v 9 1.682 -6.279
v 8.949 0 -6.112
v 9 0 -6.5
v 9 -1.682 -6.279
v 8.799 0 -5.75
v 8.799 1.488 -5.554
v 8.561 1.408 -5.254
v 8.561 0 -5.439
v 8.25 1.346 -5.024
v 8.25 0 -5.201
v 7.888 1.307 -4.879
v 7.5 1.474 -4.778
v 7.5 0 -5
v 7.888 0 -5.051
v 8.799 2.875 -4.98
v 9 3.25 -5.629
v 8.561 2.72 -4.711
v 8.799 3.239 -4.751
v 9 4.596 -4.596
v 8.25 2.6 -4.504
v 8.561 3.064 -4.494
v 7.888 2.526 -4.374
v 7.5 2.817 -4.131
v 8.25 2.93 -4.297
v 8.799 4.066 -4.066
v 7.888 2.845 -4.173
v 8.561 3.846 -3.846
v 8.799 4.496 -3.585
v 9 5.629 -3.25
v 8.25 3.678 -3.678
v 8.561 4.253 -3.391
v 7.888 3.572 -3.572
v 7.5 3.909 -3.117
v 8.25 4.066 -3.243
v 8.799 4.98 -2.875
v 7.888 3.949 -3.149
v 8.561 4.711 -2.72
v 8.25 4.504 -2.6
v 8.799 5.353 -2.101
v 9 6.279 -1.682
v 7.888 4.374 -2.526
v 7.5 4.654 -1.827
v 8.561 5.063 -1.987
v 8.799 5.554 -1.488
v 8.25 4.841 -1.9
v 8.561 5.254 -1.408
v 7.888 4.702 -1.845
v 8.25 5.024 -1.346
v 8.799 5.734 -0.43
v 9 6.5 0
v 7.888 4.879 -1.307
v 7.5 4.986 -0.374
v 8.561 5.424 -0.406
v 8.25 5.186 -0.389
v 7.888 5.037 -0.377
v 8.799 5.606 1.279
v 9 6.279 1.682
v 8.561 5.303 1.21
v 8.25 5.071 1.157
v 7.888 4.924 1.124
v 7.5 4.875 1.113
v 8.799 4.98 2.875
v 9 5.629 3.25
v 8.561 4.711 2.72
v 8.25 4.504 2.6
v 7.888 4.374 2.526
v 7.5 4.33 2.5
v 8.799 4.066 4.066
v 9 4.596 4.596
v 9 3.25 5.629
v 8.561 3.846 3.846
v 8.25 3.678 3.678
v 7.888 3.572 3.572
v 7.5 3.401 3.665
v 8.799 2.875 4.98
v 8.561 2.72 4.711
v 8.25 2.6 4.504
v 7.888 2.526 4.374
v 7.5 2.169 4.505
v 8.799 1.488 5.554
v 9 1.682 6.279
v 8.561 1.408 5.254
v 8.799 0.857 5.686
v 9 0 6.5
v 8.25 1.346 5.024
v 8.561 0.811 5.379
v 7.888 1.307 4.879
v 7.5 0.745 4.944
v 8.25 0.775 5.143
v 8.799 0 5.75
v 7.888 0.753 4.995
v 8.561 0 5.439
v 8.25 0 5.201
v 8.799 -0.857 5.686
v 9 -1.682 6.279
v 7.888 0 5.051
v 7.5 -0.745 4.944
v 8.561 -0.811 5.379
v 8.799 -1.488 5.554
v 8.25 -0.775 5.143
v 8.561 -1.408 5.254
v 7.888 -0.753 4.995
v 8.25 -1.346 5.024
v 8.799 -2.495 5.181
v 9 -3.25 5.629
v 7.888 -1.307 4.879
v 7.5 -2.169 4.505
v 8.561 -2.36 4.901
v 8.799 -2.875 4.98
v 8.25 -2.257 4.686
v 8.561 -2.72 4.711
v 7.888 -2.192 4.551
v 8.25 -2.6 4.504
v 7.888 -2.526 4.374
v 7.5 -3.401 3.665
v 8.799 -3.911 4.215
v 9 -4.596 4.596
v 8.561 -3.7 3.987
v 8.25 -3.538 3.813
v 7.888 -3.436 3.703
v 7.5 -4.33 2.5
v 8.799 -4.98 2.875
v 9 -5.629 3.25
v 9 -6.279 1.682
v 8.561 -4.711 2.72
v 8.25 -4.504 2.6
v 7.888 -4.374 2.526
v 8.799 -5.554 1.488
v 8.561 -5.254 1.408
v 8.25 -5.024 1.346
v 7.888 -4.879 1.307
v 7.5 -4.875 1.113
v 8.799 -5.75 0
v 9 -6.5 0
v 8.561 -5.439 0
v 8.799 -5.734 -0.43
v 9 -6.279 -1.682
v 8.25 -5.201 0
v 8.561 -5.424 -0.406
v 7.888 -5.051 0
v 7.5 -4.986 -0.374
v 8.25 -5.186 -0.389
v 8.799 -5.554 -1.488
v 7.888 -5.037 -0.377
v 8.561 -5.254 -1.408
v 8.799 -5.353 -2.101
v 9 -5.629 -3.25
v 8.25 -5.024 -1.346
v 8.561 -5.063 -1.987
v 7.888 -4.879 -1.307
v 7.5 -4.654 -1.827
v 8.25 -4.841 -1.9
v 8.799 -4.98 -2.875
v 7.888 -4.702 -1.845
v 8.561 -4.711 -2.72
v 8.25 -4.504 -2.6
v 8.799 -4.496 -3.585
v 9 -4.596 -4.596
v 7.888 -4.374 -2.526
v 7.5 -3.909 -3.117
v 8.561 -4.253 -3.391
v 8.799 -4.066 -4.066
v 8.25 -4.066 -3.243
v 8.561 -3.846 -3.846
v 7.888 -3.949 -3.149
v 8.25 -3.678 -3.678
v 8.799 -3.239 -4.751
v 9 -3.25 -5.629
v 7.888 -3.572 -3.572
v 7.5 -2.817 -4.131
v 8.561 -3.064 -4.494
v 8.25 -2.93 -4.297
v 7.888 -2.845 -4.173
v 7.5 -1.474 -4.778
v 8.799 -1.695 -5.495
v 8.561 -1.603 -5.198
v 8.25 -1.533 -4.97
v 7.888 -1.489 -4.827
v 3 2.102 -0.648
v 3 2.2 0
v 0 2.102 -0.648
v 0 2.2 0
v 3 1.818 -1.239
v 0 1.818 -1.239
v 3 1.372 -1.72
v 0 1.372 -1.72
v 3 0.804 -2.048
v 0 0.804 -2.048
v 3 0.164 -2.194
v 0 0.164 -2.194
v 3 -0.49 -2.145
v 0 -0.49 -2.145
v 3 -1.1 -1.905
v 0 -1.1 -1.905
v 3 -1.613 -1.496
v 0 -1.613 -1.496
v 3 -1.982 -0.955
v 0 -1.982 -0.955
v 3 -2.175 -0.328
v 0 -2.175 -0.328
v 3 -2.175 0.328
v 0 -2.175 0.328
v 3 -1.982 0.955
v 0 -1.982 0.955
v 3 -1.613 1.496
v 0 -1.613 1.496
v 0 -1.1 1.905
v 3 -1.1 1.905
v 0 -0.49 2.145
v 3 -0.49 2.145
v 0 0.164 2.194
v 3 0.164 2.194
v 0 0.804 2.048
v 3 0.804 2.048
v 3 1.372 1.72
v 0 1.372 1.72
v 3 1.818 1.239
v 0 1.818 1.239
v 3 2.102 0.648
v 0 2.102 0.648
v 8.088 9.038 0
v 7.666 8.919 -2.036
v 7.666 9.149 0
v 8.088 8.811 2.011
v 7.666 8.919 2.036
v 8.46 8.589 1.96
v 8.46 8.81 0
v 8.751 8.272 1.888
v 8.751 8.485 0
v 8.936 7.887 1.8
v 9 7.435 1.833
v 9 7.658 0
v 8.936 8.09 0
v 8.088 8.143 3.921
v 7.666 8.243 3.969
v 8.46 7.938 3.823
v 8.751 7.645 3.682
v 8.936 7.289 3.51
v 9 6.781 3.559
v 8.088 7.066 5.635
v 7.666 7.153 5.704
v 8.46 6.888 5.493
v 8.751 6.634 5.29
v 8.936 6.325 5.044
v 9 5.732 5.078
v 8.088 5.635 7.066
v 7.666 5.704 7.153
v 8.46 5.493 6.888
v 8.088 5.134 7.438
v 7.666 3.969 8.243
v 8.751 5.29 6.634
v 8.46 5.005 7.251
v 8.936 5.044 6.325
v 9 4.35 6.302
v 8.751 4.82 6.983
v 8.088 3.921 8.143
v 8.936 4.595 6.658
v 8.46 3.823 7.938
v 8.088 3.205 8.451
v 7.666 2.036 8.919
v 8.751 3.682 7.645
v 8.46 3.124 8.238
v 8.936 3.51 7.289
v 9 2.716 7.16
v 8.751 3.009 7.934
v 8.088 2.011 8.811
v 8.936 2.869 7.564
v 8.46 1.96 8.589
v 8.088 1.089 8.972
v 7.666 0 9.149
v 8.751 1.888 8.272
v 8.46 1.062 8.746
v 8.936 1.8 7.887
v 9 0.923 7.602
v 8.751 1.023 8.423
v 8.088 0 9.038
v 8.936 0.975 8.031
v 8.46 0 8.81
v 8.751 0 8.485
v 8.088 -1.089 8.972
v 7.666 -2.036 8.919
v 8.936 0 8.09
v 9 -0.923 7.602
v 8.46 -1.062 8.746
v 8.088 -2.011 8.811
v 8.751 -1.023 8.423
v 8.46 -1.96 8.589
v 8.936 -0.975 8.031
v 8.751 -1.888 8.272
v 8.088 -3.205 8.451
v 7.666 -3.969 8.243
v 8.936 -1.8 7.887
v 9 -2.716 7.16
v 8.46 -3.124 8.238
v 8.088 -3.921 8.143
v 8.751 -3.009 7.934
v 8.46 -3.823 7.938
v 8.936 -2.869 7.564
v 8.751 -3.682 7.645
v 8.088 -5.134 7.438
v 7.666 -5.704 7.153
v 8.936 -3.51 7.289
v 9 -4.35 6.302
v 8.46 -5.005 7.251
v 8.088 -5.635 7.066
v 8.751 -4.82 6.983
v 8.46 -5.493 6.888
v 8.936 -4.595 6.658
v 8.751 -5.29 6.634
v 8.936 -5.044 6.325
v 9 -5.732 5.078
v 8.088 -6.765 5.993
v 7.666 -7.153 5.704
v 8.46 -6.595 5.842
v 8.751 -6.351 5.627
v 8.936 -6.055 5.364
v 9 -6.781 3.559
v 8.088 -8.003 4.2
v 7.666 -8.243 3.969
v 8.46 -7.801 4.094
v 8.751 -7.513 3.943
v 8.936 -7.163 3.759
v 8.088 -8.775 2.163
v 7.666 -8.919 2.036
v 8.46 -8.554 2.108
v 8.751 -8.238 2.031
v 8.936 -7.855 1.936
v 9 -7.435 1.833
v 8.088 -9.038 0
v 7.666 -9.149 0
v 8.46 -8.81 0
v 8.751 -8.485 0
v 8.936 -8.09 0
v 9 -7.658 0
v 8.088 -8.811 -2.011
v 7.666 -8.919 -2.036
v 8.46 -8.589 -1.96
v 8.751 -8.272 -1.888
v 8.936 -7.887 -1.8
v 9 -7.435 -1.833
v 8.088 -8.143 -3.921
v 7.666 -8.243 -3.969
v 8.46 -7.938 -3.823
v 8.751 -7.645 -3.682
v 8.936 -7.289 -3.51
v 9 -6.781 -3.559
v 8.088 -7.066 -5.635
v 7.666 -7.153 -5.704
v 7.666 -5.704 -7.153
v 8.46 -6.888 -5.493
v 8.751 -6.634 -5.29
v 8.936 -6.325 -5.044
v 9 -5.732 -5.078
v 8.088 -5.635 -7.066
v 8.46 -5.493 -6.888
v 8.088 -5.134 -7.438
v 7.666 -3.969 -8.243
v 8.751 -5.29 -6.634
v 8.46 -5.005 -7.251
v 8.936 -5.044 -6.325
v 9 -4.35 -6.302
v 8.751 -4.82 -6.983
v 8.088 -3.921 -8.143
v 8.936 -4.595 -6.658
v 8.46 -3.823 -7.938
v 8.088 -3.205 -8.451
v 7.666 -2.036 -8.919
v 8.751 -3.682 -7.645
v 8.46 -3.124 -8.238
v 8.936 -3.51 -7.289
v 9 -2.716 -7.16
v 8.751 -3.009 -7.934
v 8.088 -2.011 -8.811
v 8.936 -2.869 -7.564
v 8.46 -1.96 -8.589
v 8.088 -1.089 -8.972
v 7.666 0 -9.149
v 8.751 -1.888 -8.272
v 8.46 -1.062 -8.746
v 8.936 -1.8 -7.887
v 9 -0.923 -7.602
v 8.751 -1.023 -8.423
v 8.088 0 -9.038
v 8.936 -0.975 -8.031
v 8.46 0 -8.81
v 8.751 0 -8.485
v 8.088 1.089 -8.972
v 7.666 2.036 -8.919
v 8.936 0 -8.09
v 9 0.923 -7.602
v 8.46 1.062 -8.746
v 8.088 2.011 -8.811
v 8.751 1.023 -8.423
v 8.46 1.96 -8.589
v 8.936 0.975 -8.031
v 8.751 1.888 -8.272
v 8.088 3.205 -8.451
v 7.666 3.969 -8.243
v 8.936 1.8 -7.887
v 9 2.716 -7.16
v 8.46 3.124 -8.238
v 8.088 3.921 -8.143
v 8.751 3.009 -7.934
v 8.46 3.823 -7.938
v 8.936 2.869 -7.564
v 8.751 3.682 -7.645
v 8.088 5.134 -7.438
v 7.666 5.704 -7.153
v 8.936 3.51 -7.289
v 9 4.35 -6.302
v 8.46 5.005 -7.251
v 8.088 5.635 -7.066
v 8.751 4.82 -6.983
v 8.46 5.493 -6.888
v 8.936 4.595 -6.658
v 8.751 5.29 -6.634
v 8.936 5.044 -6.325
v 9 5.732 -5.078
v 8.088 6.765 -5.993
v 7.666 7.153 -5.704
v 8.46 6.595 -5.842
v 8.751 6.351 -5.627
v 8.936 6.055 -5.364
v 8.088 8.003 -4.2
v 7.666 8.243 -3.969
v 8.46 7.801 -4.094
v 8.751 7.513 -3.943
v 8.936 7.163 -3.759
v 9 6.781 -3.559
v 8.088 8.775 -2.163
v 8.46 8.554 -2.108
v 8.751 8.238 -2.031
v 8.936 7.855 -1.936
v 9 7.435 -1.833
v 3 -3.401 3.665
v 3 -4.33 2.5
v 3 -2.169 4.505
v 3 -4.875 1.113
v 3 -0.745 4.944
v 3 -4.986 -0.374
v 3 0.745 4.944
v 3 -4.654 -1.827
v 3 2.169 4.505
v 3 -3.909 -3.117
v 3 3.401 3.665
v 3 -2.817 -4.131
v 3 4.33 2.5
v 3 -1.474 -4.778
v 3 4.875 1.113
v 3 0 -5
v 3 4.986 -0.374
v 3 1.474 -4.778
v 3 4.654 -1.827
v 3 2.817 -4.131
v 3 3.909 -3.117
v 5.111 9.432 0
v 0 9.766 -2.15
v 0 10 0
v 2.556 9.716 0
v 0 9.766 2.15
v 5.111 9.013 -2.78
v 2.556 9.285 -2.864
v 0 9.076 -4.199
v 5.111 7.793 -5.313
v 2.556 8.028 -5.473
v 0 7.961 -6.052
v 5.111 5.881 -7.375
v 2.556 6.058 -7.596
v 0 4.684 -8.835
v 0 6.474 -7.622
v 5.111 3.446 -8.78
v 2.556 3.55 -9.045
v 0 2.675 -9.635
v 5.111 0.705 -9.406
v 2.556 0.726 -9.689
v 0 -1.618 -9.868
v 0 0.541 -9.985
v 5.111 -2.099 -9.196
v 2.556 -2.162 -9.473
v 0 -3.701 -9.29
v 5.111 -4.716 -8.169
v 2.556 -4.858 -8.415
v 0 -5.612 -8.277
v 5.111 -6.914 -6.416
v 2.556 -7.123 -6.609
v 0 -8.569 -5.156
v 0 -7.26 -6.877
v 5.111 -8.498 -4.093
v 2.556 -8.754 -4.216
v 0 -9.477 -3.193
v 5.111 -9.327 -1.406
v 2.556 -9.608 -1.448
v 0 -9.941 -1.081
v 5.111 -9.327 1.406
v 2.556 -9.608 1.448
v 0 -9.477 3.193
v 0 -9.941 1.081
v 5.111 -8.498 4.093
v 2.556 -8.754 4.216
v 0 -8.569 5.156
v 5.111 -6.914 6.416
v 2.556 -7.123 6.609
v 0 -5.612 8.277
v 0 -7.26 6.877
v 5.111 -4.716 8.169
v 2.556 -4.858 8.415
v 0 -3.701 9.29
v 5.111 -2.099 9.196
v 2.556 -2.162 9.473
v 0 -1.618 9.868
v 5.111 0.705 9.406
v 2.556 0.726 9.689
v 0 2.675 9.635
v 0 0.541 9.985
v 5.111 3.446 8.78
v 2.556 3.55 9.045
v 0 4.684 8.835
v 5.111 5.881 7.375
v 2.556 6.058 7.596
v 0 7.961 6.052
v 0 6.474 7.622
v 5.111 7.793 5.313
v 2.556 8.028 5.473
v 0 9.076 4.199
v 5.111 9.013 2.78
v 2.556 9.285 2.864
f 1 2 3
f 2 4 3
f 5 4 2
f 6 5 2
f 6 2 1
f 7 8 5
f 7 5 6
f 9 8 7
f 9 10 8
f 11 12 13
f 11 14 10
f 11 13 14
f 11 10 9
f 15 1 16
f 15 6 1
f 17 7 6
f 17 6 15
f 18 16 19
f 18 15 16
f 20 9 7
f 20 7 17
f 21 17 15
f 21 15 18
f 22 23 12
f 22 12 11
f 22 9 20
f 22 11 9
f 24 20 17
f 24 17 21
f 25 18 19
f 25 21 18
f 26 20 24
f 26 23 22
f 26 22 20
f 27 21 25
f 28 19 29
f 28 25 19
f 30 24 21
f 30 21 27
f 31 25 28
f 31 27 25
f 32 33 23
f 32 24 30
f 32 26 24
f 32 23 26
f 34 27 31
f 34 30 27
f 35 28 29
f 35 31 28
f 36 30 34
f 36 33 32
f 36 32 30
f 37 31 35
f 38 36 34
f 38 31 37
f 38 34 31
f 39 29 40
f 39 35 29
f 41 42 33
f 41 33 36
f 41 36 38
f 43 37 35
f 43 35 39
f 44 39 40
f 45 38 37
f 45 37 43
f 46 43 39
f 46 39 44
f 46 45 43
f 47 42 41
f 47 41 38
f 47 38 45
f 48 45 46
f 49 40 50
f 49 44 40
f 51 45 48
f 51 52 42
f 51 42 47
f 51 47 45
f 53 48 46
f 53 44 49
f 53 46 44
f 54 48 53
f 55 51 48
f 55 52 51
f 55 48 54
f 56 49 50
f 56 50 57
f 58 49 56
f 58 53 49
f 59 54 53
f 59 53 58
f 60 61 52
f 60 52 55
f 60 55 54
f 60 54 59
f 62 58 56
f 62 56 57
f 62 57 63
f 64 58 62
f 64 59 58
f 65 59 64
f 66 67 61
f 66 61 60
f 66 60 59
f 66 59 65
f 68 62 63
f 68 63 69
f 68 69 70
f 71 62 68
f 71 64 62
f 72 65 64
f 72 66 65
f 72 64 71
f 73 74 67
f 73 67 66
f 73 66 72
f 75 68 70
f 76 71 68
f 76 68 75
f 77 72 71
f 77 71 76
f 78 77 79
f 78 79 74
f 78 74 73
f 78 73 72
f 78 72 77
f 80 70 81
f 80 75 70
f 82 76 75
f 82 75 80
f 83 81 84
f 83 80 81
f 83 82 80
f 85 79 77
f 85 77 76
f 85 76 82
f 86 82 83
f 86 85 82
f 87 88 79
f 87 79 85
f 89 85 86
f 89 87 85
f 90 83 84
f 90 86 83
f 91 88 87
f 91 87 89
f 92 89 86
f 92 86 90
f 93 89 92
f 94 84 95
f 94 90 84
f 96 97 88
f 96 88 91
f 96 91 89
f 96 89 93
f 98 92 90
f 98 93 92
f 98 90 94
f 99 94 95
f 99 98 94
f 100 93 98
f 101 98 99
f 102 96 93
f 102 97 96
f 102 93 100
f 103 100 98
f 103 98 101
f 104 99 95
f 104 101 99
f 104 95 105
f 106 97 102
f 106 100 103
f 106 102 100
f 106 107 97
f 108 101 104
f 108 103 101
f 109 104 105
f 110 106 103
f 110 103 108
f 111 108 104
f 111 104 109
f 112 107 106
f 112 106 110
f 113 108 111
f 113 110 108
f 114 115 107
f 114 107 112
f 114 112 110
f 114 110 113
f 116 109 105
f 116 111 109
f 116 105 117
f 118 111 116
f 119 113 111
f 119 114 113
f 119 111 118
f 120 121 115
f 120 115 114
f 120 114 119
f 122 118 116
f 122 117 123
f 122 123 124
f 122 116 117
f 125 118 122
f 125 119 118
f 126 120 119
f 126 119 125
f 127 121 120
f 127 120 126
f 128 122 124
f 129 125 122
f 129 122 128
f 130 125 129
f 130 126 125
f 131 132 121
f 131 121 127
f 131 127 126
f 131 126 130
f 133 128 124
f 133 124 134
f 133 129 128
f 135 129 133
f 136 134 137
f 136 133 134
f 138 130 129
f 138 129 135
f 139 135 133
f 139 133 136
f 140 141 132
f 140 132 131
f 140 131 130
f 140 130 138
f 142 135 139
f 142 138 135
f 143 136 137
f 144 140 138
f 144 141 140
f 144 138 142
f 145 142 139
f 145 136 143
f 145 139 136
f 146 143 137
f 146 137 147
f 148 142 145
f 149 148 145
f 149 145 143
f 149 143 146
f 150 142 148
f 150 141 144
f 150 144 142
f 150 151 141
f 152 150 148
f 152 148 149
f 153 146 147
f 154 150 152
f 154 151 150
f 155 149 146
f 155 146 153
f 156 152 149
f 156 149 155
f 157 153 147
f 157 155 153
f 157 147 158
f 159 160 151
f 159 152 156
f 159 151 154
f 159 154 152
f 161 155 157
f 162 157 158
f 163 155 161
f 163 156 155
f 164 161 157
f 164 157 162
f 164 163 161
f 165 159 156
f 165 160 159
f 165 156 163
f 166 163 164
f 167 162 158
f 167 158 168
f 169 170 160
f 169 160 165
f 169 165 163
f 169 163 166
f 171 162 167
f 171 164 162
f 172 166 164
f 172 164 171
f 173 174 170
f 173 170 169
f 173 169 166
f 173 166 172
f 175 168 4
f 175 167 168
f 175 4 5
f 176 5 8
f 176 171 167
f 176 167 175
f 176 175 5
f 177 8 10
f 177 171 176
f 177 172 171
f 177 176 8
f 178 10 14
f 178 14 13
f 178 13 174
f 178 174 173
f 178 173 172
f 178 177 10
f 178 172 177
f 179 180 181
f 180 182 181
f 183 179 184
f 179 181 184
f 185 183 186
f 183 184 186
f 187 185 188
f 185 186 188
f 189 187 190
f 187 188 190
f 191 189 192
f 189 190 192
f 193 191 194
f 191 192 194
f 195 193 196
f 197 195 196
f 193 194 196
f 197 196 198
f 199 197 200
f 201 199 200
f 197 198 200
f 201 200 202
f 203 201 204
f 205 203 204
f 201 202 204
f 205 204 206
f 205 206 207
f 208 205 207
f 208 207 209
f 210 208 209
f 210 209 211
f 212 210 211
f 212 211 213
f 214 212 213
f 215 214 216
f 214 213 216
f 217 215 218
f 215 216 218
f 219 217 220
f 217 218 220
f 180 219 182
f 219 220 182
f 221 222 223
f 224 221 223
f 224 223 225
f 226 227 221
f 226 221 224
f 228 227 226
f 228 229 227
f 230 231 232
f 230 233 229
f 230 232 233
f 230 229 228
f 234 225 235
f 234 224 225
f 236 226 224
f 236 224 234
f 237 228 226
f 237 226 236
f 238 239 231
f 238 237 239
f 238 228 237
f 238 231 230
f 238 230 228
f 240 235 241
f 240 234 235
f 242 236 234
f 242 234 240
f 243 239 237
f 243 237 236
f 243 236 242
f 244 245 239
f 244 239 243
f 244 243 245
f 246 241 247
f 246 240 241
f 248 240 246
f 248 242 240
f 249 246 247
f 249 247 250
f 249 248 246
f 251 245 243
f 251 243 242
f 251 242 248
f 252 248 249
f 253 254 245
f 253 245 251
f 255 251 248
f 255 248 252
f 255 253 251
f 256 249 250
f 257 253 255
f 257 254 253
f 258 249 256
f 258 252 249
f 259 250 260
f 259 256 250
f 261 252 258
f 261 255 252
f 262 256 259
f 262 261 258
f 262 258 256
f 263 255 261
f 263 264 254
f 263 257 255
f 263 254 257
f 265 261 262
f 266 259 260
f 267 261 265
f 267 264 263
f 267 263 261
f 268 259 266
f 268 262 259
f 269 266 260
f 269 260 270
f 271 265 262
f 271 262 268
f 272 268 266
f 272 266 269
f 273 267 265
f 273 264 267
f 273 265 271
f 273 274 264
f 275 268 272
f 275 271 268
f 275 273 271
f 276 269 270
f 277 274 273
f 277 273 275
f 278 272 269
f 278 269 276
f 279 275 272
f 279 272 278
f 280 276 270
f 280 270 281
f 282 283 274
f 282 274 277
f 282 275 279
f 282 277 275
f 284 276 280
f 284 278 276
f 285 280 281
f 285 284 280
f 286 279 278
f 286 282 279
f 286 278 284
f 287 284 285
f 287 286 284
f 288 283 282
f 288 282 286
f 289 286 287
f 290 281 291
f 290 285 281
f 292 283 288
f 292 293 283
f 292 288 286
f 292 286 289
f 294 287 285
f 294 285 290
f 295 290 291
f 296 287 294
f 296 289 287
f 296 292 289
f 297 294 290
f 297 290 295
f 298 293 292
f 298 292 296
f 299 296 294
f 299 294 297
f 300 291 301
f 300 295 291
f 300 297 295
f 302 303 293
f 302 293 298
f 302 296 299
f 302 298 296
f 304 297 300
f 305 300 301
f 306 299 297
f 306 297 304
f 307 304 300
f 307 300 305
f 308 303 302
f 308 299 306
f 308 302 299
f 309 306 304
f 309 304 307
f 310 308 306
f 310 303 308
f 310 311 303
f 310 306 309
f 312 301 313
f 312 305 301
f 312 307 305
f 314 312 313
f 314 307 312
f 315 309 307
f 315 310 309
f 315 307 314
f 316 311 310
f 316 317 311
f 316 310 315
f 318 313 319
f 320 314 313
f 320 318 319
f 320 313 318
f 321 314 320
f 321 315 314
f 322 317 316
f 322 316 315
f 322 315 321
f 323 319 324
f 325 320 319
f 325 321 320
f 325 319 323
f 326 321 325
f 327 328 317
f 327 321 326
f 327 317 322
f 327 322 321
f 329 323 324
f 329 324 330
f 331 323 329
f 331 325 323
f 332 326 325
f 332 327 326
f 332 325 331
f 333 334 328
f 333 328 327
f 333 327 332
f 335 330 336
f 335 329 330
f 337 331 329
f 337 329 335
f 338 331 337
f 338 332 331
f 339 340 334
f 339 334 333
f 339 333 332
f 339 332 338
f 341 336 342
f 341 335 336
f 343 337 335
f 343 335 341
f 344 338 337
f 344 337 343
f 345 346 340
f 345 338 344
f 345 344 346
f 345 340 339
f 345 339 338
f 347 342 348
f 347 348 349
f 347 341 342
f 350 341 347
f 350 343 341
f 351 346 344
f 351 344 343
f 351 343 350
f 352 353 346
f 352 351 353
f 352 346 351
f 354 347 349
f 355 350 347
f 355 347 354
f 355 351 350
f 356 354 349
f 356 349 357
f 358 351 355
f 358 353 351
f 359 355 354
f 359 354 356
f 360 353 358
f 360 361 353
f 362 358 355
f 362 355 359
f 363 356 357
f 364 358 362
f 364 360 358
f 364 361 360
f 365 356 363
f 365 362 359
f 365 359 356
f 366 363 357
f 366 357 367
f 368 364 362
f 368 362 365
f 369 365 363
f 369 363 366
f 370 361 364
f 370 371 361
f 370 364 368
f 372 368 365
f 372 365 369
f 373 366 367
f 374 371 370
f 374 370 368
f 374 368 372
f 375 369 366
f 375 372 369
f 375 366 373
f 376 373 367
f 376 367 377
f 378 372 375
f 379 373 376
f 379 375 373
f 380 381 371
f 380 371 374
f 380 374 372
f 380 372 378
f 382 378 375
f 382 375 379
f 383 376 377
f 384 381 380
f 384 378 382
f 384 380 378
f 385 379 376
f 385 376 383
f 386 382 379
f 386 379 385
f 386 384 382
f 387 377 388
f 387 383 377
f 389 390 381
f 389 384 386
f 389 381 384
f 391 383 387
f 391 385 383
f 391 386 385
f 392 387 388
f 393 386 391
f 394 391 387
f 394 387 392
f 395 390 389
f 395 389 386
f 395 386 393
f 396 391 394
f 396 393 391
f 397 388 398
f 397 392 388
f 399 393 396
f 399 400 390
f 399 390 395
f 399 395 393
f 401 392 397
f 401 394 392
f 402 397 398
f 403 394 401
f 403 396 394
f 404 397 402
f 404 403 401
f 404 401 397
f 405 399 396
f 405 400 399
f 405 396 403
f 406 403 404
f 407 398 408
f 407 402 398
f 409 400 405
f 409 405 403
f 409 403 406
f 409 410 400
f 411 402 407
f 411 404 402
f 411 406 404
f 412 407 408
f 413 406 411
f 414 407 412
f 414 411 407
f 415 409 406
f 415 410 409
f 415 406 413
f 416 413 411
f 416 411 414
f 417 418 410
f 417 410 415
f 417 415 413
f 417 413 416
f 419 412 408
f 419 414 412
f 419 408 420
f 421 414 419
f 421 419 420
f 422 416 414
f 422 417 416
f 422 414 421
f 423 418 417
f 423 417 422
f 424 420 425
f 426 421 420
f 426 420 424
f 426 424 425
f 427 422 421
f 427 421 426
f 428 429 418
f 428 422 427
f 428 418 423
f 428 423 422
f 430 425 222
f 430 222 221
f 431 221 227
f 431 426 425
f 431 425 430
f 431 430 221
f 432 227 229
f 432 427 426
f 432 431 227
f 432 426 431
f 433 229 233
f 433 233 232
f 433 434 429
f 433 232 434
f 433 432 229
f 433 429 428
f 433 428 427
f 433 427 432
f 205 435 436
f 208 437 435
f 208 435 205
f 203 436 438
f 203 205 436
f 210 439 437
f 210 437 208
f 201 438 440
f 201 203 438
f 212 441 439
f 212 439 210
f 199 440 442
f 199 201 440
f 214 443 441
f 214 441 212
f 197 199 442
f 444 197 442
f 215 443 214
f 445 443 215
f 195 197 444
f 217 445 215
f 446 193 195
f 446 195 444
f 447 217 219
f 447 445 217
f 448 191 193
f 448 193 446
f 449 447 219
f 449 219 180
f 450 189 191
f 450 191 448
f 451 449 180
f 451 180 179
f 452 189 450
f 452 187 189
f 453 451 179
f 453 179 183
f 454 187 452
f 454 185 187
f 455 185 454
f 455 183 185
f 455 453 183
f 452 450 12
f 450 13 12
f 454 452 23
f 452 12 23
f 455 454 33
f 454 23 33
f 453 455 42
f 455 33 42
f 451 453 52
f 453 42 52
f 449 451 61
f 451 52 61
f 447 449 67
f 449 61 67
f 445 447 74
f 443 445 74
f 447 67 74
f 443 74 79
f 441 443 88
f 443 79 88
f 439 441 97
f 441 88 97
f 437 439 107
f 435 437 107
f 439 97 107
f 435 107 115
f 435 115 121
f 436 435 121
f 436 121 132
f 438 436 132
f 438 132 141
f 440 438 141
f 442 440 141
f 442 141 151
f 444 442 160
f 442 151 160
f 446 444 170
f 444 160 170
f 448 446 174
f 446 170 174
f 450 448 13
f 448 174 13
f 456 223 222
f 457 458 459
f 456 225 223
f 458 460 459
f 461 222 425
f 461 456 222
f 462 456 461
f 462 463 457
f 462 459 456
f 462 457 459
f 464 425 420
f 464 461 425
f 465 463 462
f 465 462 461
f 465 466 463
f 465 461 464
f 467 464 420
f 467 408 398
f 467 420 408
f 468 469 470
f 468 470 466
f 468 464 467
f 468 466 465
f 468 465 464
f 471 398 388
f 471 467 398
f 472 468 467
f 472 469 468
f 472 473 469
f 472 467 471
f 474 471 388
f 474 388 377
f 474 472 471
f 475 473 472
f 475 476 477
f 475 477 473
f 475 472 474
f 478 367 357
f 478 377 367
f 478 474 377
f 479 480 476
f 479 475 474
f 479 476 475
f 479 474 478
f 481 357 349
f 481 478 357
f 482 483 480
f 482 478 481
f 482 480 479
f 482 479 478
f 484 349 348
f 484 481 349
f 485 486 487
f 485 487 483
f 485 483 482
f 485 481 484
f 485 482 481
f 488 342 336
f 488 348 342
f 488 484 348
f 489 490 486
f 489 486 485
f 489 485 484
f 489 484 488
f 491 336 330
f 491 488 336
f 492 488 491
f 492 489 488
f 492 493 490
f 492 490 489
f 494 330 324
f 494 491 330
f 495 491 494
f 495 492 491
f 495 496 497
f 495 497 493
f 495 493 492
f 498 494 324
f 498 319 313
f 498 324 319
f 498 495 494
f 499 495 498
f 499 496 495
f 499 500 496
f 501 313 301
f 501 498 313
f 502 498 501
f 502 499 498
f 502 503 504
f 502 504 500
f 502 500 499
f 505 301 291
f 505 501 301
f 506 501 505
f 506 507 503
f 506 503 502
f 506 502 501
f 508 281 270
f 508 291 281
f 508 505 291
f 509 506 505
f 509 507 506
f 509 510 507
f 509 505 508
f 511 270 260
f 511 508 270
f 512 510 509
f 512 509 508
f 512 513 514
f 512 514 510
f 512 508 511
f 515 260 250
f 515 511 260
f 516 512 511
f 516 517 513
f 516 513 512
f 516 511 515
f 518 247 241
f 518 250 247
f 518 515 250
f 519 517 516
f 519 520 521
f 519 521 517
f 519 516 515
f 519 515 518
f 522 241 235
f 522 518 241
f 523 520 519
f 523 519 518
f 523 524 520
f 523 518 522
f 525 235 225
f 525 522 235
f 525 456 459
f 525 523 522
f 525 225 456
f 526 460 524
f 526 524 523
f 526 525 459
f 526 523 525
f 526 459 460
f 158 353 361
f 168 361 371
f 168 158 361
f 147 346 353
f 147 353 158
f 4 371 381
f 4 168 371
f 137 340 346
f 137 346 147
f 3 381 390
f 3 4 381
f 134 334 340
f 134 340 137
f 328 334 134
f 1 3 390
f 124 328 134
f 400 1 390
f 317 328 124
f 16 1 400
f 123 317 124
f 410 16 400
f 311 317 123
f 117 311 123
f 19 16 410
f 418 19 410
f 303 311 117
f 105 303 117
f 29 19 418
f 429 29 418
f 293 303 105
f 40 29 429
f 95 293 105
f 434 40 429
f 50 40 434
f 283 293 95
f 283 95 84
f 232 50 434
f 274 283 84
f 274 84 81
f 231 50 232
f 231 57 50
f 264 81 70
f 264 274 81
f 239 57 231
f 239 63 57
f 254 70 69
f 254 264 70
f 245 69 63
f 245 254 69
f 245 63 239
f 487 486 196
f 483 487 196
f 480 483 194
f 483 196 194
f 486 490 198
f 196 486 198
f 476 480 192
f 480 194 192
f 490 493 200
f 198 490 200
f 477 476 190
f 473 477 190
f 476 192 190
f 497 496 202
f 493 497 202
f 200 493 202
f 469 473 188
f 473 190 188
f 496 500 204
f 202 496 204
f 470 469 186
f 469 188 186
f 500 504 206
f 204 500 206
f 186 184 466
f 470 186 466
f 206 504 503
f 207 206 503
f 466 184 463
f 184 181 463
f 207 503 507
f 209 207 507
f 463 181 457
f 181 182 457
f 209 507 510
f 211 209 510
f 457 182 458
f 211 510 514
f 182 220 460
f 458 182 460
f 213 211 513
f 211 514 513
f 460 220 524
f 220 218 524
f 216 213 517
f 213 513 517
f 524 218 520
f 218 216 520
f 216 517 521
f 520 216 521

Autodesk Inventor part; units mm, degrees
ref_plane "YZ Plane" through (0, 0, 0) normal (1, 0, 0) x (0, 1, 0)
ref_plane "XZ Plane" through (0, 0, 0) normal (0, 1, 0) x (-1, 0, 0)
ref_plane "XY Plane" through (0, 0, 0) normal (0, 0, 1) x (1, 0, 0)
sketch "Sketch1" plane through (0, 0, 0) normal (1, 0, 0) x (0, 1, 0)
  circle A0 centre (0, 0) radius 10
  circle A1 centre (0, 0) radius 2.2
  dimension "d0" = 20
  dimension "d1" = 4.4
extrude "Extrusion1" add sketch "Sketch1" along normal blind 9
sketch "Sketch2" plane through (9, 0, 0) normal (1, 0, 0) x (0, 0, -1)
  circle A0 centre (0, 0) radius 5
  dimension "d4" = 10
extrude "Extrusion2" cut sketch "Sketch2" against normal blind 6
chamfer "Chamfer1" distance 1 distance2 9 1 edges at (9, -10, 0) measured on face at (9, 8.2243, -0.9986)
fillet "Fillet2" radius 1.5 2 edges at (9, -9.0005, 0) (9, 0, 5)
properties part number "rubberen_voetje" material "Rubber"
